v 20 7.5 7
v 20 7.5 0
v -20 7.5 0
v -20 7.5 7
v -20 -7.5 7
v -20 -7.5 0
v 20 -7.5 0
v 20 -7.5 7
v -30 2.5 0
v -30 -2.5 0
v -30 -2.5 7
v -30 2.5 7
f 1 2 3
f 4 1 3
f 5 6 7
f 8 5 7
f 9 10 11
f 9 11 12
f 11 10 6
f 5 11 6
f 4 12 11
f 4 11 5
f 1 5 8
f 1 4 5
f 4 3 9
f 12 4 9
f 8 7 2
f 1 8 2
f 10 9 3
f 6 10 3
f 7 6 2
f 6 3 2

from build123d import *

# Parameters (mm, degrees)
F0_W     = 10
F0_H     = 5
F1_DEPTH = 7


with BuildPart() as f1:
    # F0 (on Top) → F1 (new body)
    with BuildSketch(Plane.XY):
        Polygon((-20, -7.5), (20, -7.5), (20, 7.5), (-20, 7.5), (-20, 2.5), (-20, -2.5), align=None)
        Polygon((-30, -2.5), (-20, -7.5), (-20, -2.5), align=None)
        with Locations((-25, 0)):
            Rectangle(F0_W, F0_H)
        Polygon((-20, 2.5), (-20, 7.5), (-30, 2.5), align=None)
    extrude(amount=F1_DEPTH)


solid = f1.part
